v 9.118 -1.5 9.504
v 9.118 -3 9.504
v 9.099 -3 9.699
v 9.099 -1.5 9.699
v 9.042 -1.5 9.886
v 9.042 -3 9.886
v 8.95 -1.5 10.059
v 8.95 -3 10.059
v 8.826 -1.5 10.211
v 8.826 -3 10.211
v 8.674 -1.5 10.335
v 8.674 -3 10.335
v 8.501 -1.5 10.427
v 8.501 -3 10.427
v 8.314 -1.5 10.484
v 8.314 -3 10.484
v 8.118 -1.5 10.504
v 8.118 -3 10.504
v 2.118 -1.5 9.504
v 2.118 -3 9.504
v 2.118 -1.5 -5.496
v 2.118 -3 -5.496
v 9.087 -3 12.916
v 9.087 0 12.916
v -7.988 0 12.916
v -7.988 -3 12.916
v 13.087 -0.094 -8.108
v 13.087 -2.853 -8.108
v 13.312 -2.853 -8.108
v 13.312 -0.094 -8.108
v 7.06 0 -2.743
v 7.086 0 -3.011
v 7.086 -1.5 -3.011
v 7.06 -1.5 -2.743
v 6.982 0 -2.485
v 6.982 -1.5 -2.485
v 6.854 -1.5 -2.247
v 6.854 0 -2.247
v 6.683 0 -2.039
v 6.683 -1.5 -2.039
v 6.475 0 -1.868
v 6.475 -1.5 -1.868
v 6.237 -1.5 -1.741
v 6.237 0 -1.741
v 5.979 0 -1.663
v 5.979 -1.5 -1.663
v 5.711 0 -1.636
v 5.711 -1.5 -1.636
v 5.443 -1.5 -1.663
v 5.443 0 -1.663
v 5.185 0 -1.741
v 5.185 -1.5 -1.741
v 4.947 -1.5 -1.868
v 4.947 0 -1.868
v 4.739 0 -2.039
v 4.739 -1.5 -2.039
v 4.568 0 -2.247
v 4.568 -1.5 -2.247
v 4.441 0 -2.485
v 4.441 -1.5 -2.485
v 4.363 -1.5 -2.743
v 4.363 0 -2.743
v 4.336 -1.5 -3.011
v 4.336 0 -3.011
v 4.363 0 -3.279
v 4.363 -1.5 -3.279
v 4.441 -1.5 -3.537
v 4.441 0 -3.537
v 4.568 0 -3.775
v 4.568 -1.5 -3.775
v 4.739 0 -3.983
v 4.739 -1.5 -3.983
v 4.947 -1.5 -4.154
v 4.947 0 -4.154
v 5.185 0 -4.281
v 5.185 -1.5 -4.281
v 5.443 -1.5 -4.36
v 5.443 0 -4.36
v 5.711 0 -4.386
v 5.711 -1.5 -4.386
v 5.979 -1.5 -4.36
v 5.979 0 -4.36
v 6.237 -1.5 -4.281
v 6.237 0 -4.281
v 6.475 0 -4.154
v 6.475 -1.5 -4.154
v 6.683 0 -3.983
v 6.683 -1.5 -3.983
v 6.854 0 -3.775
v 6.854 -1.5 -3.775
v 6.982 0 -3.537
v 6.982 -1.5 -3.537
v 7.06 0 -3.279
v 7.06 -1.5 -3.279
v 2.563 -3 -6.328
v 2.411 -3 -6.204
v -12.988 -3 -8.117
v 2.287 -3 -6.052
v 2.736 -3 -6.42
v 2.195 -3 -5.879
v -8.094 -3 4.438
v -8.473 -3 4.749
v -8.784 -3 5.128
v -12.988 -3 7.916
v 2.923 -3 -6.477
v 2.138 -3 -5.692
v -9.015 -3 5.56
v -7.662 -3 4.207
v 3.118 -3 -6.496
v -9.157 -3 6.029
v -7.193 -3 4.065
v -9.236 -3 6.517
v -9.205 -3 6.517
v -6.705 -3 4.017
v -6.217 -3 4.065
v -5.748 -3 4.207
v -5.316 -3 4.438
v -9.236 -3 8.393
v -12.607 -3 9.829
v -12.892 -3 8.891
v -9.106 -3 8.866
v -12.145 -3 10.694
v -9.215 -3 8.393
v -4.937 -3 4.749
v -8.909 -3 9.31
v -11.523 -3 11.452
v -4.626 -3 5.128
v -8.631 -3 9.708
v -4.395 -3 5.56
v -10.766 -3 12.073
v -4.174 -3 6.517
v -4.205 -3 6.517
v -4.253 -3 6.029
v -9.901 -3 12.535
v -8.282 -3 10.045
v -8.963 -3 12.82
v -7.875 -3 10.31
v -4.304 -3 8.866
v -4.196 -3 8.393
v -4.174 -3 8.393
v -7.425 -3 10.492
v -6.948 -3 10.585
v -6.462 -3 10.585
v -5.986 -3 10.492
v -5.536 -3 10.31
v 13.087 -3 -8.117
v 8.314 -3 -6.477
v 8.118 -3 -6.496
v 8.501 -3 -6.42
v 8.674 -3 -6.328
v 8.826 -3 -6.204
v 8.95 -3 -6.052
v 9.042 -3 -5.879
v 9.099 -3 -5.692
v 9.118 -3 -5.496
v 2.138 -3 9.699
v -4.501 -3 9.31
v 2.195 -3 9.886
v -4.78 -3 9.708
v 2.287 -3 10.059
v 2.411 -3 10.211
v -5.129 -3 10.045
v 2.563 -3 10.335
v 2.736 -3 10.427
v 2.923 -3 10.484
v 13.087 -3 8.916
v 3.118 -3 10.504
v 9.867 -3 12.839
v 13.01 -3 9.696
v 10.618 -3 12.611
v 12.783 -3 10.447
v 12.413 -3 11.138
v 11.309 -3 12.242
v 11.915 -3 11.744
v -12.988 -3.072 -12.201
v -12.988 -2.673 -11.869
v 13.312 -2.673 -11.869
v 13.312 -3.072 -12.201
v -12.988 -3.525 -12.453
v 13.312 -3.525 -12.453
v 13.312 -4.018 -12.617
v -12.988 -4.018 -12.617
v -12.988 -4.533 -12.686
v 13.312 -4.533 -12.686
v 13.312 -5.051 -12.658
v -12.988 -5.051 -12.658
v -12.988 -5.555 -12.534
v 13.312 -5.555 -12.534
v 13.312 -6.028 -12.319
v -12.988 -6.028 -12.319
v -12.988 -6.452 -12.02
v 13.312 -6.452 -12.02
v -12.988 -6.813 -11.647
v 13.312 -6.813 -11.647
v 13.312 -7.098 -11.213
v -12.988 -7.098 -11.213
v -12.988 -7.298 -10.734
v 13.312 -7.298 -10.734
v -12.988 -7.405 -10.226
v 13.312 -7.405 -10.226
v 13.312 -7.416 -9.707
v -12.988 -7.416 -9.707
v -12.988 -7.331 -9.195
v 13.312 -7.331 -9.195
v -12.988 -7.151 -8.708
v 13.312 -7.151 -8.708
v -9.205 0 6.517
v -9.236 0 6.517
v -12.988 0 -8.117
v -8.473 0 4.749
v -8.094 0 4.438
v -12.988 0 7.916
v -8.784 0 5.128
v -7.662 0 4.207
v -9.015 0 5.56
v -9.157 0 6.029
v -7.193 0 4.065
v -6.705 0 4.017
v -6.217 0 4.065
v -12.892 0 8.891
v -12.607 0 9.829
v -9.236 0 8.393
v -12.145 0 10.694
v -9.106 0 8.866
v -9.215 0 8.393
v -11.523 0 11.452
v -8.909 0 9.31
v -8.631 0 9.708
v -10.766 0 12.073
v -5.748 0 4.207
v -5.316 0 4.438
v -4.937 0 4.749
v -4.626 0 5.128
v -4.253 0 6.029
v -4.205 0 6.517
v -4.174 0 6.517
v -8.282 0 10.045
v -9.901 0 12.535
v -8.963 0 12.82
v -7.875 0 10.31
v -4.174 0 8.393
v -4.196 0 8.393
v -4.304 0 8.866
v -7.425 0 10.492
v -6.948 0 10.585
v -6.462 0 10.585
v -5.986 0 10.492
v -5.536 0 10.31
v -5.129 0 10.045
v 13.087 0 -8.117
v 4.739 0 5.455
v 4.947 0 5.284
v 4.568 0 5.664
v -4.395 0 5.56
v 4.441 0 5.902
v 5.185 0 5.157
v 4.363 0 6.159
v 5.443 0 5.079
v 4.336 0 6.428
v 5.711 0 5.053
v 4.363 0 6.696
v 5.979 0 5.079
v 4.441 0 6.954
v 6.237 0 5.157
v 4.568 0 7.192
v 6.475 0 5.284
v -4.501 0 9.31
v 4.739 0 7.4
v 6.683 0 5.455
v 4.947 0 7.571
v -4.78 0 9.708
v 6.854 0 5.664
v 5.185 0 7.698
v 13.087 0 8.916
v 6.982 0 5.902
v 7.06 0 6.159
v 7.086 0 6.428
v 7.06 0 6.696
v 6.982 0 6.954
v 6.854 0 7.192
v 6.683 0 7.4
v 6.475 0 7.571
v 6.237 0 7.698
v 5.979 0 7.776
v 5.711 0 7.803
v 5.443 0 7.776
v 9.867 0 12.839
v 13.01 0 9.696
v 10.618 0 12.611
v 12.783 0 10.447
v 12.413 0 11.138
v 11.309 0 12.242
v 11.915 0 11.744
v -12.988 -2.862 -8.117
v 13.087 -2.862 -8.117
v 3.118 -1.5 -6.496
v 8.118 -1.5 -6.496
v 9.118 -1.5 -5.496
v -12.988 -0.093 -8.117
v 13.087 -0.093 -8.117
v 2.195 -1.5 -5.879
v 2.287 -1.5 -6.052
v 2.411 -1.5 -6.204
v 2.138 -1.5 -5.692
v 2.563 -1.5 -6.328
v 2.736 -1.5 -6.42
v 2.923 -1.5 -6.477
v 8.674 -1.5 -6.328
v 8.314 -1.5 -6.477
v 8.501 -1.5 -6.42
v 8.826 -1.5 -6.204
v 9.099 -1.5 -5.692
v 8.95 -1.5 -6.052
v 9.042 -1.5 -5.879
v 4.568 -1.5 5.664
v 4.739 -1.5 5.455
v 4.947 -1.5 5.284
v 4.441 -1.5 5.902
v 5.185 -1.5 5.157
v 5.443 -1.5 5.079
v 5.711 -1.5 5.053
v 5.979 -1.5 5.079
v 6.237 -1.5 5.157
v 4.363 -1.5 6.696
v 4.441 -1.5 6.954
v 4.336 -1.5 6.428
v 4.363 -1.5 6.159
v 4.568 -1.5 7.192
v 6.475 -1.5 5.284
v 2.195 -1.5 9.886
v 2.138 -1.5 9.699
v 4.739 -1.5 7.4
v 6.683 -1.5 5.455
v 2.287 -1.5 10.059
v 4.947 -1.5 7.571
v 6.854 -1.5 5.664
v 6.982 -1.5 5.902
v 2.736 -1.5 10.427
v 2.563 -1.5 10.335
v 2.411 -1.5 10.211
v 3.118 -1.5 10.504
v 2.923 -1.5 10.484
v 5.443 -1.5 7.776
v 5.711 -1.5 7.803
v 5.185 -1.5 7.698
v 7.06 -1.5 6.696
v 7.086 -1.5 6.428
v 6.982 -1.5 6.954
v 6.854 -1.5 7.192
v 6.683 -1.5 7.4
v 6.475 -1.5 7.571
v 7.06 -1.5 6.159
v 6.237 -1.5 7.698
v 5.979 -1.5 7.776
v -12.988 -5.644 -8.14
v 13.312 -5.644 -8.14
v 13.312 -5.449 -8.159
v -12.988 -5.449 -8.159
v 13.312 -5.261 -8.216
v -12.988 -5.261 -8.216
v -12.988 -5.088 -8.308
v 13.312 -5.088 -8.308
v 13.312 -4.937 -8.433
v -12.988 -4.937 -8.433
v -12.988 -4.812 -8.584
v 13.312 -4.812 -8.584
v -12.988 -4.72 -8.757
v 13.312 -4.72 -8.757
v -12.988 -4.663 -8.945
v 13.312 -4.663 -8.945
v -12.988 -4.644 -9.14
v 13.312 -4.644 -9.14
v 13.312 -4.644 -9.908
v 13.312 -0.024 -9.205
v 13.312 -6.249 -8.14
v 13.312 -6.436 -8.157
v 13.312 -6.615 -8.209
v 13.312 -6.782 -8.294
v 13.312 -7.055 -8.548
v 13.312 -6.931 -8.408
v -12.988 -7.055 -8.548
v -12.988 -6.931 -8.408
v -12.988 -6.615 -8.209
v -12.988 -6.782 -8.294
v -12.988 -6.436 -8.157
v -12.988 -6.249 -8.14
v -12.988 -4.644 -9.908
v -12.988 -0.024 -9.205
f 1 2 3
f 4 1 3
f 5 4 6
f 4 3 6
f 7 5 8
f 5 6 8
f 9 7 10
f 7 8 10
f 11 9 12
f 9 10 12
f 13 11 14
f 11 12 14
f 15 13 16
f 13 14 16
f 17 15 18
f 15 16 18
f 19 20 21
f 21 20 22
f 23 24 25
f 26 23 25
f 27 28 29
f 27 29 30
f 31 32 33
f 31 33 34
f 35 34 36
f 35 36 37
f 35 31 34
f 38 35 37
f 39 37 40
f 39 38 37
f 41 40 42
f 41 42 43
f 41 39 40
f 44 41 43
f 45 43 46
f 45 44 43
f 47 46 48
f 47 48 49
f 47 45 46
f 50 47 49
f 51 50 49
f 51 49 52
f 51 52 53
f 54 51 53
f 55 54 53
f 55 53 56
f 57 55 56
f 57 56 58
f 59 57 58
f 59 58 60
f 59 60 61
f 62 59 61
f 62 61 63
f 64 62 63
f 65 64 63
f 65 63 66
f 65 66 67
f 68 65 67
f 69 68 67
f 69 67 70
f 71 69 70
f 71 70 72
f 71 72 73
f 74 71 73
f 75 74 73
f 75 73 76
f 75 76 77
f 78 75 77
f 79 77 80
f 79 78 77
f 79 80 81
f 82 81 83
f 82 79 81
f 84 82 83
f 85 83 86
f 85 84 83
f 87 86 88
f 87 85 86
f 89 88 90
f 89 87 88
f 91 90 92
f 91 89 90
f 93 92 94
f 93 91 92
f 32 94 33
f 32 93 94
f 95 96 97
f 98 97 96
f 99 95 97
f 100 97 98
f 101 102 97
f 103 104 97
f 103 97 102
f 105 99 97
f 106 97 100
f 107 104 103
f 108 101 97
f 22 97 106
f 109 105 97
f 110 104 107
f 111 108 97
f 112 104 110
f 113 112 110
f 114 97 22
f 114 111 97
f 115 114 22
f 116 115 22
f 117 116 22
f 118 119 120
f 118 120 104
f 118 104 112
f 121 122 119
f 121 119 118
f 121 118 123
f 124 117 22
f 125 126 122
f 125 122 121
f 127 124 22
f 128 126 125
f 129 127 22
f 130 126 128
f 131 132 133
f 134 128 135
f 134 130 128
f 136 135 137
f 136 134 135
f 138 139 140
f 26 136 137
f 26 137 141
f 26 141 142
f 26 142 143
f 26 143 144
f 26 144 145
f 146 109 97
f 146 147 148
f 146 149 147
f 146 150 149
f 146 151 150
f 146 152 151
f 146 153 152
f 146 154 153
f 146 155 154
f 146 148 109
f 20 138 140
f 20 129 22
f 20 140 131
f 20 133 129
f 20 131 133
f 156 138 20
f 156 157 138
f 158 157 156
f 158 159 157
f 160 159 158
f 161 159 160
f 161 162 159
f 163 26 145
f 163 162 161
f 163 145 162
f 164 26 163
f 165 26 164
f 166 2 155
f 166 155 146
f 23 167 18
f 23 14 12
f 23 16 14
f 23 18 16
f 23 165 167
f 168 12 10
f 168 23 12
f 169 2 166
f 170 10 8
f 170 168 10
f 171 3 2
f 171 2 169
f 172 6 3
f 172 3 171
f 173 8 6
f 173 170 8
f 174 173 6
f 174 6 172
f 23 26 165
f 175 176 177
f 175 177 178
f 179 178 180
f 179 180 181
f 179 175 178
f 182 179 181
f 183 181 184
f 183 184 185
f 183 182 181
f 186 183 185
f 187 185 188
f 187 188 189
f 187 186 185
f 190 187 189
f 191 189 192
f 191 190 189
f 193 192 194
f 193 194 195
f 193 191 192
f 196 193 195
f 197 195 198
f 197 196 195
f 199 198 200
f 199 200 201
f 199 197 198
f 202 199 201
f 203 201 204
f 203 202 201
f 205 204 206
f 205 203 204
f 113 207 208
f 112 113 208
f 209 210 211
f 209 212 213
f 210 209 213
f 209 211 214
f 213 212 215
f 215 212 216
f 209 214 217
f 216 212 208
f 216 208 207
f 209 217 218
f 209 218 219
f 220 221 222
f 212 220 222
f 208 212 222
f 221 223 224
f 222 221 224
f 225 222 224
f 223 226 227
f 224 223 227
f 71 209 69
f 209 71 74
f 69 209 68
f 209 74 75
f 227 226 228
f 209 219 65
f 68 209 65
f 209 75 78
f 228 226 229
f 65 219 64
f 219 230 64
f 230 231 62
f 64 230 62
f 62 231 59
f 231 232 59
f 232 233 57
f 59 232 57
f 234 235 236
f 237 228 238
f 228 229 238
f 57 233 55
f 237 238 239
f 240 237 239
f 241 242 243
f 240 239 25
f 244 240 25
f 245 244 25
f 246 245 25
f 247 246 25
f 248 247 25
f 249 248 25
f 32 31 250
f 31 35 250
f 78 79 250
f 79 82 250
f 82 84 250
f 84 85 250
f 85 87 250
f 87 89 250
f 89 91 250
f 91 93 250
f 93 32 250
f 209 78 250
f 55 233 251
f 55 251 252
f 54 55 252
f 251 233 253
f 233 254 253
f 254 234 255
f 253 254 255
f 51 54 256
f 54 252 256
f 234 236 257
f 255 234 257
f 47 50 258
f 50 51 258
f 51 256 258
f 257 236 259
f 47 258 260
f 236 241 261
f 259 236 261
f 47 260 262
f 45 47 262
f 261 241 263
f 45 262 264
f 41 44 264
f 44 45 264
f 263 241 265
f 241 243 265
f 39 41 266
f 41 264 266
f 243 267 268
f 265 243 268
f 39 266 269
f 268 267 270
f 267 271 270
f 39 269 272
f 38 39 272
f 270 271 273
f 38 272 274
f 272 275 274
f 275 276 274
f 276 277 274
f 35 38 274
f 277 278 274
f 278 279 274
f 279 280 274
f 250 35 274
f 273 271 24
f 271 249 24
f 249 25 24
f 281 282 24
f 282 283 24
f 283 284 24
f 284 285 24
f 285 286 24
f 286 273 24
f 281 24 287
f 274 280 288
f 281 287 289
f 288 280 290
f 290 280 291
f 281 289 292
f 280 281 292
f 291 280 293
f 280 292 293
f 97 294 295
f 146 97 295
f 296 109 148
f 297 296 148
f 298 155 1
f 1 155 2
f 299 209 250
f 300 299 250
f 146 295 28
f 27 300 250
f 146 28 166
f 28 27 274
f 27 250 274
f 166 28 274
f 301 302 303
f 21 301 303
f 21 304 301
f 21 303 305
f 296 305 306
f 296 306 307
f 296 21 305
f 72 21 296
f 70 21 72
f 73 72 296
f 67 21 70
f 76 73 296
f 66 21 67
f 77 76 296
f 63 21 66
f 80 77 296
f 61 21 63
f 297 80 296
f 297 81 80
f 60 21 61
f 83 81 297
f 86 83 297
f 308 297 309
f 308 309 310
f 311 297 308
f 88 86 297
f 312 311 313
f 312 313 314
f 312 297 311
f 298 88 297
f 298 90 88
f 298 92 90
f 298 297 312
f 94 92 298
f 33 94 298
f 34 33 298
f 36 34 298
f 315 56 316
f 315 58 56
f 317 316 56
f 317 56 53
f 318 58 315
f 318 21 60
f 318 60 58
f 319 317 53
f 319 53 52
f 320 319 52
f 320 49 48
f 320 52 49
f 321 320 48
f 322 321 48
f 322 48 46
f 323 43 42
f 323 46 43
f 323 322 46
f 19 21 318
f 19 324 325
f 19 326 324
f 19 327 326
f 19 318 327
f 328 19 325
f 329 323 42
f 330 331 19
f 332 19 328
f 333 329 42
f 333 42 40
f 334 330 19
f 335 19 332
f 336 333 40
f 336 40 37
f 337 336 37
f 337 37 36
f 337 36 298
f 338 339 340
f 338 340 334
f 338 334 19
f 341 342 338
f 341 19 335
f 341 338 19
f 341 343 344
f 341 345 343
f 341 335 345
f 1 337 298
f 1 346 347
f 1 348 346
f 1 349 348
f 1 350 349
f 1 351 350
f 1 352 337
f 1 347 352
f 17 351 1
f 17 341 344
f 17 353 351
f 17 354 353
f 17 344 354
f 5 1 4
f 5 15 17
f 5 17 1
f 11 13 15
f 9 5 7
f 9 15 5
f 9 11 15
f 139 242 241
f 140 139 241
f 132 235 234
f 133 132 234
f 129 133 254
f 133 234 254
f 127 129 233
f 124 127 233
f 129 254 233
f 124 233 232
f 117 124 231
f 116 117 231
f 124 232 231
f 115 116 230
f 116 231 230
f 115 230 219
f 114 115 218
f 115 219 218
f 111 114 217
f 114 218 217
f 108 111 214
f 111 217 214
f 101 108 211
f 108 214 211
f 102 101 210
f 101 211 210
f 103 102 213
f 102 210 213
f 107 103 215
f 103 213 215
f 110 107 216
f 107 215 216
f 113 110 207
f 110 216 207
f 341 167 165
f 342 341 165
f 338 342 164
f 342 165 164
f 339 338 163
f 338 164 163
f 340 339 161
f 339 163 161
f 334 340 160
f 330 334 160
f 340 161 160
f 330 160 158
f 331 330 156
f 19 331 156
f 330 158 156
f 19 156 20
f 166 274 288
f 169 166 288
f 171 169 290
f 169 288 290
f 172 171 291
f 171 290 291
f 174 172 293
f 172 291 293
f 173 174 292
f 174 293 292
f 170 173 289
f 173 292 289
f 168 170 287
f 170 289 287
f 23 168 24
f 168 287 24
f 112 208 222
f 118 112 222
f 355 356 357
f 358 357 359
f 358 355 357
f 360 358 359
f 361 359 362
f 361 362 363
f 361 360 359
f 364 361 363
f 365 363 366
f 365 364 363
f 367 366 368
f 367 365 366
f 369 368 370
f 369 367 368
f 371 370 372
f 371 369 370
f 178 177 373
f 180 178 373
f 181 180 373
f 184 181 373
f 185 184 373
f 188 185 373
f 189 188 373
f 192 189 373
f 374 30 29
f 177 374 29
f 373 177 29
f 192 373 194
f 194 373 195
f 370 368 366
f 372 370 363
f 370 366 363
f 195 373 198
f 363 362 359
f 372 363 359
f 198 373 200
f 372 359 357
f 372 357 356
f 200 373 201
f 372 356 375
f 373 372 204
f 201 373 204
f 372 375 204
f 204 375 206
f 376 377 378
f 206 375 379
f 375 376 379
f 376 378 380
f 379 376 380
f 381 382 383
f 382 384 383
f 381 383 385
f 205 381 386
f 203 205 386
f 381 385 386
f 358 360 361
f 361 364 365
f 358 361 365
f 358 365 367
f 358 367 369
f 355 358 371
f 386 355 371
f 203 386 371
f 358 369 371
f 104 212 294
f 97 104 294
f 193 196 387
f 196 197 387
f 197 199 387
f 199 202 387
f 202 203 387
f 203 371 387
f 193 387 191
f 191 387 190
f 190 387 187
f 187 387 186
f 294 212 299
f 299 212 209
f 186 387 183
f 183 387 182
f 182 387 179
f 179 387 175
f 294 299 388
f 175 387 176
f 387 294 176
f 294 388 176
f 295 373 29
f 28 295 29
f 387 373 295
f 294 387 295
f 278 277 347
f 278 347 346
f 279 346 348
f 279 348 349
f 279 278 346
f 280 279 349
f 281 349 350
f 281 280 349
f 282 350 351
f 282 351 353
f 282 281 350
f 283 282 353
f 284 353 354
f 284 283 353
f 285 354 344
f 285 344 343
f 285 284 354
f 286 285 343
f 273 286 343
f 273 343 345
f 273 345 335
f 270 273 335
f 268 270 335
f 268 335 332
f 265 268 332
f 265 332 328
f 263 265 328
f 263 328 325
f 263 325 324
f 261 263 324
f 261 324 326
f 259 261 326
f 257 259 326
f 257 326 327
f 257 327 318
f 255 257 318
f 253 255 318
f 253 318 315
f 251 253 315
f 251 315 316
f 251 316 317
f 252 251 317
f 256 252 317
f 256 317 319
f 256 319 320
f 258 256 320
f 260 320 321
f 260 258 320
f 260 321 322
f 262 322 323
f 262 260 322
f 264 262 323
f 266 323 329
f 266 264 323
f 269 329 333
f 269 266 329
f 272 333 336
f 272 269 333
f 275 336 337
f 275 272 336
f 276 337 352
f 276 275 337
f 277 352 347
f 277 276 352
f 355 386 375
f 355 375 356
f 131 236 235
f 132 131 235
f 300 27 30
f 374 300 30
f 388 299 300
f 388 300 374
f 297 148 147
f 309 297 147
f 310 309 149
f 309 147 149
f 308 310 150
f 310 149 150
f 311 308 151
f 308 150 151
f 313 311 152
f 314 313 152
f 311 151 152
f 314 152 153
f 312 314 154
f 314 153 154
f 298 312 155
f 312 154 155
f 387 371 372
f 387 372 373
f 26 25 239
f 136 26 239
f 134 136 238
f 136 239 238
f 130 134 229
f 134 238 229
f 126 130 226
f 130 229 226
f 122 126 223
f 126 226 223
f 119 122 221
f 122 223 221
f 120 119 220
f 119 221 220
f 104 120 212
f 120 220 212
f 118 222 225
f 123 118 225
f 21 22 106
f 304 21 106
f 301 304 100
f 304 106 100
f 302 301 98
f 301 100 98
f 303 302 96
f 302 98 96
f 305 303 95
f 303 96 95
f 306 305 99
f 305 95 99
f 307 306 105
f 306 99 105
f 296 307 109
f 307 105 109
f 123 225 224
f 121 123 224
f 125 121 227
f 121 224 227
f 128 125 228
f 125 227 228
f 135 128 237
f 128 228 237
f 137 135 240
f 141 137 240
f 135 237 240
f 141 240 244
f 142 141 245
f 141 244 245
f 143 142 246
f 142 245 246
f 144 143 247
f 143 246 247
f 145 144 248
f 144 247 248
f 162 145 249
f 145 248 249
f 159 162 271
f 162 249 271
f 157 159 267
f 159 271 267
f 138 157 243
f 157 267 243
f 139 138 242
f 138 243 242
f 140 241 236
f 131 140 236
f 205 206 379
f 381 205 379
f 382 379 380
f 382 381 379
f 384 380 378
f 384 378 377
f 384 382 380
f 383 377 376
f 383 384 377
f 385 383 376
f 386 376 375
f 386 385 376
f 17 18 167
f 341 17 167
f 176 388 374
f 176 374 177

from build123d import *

# Parameters (mm, degrees)
F0_R     = 1.375
F1_DEPTH = 3
F2_R     = 1.375
F3_DEPTH = 1.5
F6_DEPTH = 26.3


with BuildPart() as f1:
    # F0 (on Front) → F1 (new body)
    with BuildSketch(Plane.XZ):
        with BuildLine():
            Line((9.087011, 12.915978), (-7.987775, 12.915978))
            ThreePointArc((-7.987775, 12.915978), (-11.523309, 11.451512), (-12.987775, 7.915978))
            Line((-12.987775, 7.915978), (-12.987775, -8.116753))
            Line((-12.987775, -8.116753), (-12.451817, -8.116753))
            Line((-12.451817, -8.116753), (13.087011, -8.116753))
            Line((13.087011, -8.116753), (13.087011, 8.915978))
            ThreePointArc((13.087011, 8.915978), (11.915438, 11.744405), (9.087011, 12.915978))
        make_face()
        with Locations((5.711206, -3.011084)):
            Circle(F0_R, mode=Mode.SUBTRACT)
        with BuildLine():
            Line((-9.236069, 8.065383), (-9.236069, 8.392912))
            Line((-9.236069, 8.392912), (-9.214787, 8.392912))
            ThreePointArc((-9.214787, 8.392912), (-6.705156, 10.596296), (-4.195525, 8.392912))
            Line((-4.195525, 8.392912), (-4.174243, 8.392912))
            Line((-4.174243, 8.392912), (-4.174243, 8.065383))
            Line((-4.174243, 8.065383), (-4.174243, 6.51706))
            Line((-4.174243, 6.51706), (-4.205156, 6.51706))
            ThreePointArc((-4.205156, 6.51706), (-6.705156, 4.01706), (-9.205156, 6.51706))
            Line((-9.205156, 6.51706), (-9.236069, 6.51706))
            Line((-9.236069, 6.51706), (-9.236069, 8.065383))
        make_face(mode=Mode.SUBTRACT)
        with Locations((5.711206, 6.427733)):
            Circle(F0_R, mode=Mode.SUBTRACT)
    extrude(amount=F1_DEPTH)

    # F2 (on face) → F3 (cut)
    with BuildSketch(Plane.XZ.offset(3)):
        with BuildLine():
            Line((8.118485, 10.503516), (3.118485, 10.503516))
            ThreePointArc((3.118485, 10.503516), (2.411378, 10.210622), (2.118485, 9.503516))
            Line((2.118485, 9.503516), (2.118485, -5.496484))
            ThreePointArc((2.118485, -5.496484), (2.411378, -6.203591), (3.118485, -6.496484))
            Line((3.118485, -6.496484), (8.118485, -6.496484))
            ThreePointArc((8.118485, -6.496484), (8.825592, -6.203591), (9.118485, -5.496484))
            Line((9.118485, -5.496484), (9.118485, 9.503516))
            ThreePointArc((9.118485, 9.503516), (8.825592, 10.210622), (8.118485, 10.503516))
        make_face()
        with Locations((5.711206, -3.011084)):
            Circle(F2_R, mode=Mode.SUBTRACT)
        with Locations((5.711206, 6.427733)):
            Circle(F2_R, mode=Mode.SUBTRACT)
    extrude(amount=-F3_DEPTH, mode=Mode.SUBTRACT)

    # F5 (on face) → F6 (join)
    with BuildSketch(Plane(origin=(-12.987775, 0, 0), x_dir=(0, -1, 0), z_dir=(-1, 0, 0))):
        with BuildLine():
            Line((0.094025, -8.107936), (0.023512, -9.205496))
            Line((0.023512, -9.205496), (2.672946, -11.868593))
            ThreePointArc((2.672946, -11.868593), (6.246579, -12.179247), (7.151377, -8.708124))
            ThreePointArc((7.151377, -8.708124), (6.782416, -8.293676), (6.249313, -8.139726))
            Line((6.249313, -8.139726), (5.643703, -8.139726))
            ThreePointArc((5.643703, -8.139726), (4.936596, -8.432619), (4.643703, -9.139726))
            Line((4.643703, -9.139726), (4.643703, -9.907948))
            Line((4.643703, -9.907948), (2.852926, -8.107936))
            Line((2.852926, -8.107936), (0.094025, -8.107936))
        make_face()
    extrude(amount=-F6_DEPTH)


solid = f1.part
